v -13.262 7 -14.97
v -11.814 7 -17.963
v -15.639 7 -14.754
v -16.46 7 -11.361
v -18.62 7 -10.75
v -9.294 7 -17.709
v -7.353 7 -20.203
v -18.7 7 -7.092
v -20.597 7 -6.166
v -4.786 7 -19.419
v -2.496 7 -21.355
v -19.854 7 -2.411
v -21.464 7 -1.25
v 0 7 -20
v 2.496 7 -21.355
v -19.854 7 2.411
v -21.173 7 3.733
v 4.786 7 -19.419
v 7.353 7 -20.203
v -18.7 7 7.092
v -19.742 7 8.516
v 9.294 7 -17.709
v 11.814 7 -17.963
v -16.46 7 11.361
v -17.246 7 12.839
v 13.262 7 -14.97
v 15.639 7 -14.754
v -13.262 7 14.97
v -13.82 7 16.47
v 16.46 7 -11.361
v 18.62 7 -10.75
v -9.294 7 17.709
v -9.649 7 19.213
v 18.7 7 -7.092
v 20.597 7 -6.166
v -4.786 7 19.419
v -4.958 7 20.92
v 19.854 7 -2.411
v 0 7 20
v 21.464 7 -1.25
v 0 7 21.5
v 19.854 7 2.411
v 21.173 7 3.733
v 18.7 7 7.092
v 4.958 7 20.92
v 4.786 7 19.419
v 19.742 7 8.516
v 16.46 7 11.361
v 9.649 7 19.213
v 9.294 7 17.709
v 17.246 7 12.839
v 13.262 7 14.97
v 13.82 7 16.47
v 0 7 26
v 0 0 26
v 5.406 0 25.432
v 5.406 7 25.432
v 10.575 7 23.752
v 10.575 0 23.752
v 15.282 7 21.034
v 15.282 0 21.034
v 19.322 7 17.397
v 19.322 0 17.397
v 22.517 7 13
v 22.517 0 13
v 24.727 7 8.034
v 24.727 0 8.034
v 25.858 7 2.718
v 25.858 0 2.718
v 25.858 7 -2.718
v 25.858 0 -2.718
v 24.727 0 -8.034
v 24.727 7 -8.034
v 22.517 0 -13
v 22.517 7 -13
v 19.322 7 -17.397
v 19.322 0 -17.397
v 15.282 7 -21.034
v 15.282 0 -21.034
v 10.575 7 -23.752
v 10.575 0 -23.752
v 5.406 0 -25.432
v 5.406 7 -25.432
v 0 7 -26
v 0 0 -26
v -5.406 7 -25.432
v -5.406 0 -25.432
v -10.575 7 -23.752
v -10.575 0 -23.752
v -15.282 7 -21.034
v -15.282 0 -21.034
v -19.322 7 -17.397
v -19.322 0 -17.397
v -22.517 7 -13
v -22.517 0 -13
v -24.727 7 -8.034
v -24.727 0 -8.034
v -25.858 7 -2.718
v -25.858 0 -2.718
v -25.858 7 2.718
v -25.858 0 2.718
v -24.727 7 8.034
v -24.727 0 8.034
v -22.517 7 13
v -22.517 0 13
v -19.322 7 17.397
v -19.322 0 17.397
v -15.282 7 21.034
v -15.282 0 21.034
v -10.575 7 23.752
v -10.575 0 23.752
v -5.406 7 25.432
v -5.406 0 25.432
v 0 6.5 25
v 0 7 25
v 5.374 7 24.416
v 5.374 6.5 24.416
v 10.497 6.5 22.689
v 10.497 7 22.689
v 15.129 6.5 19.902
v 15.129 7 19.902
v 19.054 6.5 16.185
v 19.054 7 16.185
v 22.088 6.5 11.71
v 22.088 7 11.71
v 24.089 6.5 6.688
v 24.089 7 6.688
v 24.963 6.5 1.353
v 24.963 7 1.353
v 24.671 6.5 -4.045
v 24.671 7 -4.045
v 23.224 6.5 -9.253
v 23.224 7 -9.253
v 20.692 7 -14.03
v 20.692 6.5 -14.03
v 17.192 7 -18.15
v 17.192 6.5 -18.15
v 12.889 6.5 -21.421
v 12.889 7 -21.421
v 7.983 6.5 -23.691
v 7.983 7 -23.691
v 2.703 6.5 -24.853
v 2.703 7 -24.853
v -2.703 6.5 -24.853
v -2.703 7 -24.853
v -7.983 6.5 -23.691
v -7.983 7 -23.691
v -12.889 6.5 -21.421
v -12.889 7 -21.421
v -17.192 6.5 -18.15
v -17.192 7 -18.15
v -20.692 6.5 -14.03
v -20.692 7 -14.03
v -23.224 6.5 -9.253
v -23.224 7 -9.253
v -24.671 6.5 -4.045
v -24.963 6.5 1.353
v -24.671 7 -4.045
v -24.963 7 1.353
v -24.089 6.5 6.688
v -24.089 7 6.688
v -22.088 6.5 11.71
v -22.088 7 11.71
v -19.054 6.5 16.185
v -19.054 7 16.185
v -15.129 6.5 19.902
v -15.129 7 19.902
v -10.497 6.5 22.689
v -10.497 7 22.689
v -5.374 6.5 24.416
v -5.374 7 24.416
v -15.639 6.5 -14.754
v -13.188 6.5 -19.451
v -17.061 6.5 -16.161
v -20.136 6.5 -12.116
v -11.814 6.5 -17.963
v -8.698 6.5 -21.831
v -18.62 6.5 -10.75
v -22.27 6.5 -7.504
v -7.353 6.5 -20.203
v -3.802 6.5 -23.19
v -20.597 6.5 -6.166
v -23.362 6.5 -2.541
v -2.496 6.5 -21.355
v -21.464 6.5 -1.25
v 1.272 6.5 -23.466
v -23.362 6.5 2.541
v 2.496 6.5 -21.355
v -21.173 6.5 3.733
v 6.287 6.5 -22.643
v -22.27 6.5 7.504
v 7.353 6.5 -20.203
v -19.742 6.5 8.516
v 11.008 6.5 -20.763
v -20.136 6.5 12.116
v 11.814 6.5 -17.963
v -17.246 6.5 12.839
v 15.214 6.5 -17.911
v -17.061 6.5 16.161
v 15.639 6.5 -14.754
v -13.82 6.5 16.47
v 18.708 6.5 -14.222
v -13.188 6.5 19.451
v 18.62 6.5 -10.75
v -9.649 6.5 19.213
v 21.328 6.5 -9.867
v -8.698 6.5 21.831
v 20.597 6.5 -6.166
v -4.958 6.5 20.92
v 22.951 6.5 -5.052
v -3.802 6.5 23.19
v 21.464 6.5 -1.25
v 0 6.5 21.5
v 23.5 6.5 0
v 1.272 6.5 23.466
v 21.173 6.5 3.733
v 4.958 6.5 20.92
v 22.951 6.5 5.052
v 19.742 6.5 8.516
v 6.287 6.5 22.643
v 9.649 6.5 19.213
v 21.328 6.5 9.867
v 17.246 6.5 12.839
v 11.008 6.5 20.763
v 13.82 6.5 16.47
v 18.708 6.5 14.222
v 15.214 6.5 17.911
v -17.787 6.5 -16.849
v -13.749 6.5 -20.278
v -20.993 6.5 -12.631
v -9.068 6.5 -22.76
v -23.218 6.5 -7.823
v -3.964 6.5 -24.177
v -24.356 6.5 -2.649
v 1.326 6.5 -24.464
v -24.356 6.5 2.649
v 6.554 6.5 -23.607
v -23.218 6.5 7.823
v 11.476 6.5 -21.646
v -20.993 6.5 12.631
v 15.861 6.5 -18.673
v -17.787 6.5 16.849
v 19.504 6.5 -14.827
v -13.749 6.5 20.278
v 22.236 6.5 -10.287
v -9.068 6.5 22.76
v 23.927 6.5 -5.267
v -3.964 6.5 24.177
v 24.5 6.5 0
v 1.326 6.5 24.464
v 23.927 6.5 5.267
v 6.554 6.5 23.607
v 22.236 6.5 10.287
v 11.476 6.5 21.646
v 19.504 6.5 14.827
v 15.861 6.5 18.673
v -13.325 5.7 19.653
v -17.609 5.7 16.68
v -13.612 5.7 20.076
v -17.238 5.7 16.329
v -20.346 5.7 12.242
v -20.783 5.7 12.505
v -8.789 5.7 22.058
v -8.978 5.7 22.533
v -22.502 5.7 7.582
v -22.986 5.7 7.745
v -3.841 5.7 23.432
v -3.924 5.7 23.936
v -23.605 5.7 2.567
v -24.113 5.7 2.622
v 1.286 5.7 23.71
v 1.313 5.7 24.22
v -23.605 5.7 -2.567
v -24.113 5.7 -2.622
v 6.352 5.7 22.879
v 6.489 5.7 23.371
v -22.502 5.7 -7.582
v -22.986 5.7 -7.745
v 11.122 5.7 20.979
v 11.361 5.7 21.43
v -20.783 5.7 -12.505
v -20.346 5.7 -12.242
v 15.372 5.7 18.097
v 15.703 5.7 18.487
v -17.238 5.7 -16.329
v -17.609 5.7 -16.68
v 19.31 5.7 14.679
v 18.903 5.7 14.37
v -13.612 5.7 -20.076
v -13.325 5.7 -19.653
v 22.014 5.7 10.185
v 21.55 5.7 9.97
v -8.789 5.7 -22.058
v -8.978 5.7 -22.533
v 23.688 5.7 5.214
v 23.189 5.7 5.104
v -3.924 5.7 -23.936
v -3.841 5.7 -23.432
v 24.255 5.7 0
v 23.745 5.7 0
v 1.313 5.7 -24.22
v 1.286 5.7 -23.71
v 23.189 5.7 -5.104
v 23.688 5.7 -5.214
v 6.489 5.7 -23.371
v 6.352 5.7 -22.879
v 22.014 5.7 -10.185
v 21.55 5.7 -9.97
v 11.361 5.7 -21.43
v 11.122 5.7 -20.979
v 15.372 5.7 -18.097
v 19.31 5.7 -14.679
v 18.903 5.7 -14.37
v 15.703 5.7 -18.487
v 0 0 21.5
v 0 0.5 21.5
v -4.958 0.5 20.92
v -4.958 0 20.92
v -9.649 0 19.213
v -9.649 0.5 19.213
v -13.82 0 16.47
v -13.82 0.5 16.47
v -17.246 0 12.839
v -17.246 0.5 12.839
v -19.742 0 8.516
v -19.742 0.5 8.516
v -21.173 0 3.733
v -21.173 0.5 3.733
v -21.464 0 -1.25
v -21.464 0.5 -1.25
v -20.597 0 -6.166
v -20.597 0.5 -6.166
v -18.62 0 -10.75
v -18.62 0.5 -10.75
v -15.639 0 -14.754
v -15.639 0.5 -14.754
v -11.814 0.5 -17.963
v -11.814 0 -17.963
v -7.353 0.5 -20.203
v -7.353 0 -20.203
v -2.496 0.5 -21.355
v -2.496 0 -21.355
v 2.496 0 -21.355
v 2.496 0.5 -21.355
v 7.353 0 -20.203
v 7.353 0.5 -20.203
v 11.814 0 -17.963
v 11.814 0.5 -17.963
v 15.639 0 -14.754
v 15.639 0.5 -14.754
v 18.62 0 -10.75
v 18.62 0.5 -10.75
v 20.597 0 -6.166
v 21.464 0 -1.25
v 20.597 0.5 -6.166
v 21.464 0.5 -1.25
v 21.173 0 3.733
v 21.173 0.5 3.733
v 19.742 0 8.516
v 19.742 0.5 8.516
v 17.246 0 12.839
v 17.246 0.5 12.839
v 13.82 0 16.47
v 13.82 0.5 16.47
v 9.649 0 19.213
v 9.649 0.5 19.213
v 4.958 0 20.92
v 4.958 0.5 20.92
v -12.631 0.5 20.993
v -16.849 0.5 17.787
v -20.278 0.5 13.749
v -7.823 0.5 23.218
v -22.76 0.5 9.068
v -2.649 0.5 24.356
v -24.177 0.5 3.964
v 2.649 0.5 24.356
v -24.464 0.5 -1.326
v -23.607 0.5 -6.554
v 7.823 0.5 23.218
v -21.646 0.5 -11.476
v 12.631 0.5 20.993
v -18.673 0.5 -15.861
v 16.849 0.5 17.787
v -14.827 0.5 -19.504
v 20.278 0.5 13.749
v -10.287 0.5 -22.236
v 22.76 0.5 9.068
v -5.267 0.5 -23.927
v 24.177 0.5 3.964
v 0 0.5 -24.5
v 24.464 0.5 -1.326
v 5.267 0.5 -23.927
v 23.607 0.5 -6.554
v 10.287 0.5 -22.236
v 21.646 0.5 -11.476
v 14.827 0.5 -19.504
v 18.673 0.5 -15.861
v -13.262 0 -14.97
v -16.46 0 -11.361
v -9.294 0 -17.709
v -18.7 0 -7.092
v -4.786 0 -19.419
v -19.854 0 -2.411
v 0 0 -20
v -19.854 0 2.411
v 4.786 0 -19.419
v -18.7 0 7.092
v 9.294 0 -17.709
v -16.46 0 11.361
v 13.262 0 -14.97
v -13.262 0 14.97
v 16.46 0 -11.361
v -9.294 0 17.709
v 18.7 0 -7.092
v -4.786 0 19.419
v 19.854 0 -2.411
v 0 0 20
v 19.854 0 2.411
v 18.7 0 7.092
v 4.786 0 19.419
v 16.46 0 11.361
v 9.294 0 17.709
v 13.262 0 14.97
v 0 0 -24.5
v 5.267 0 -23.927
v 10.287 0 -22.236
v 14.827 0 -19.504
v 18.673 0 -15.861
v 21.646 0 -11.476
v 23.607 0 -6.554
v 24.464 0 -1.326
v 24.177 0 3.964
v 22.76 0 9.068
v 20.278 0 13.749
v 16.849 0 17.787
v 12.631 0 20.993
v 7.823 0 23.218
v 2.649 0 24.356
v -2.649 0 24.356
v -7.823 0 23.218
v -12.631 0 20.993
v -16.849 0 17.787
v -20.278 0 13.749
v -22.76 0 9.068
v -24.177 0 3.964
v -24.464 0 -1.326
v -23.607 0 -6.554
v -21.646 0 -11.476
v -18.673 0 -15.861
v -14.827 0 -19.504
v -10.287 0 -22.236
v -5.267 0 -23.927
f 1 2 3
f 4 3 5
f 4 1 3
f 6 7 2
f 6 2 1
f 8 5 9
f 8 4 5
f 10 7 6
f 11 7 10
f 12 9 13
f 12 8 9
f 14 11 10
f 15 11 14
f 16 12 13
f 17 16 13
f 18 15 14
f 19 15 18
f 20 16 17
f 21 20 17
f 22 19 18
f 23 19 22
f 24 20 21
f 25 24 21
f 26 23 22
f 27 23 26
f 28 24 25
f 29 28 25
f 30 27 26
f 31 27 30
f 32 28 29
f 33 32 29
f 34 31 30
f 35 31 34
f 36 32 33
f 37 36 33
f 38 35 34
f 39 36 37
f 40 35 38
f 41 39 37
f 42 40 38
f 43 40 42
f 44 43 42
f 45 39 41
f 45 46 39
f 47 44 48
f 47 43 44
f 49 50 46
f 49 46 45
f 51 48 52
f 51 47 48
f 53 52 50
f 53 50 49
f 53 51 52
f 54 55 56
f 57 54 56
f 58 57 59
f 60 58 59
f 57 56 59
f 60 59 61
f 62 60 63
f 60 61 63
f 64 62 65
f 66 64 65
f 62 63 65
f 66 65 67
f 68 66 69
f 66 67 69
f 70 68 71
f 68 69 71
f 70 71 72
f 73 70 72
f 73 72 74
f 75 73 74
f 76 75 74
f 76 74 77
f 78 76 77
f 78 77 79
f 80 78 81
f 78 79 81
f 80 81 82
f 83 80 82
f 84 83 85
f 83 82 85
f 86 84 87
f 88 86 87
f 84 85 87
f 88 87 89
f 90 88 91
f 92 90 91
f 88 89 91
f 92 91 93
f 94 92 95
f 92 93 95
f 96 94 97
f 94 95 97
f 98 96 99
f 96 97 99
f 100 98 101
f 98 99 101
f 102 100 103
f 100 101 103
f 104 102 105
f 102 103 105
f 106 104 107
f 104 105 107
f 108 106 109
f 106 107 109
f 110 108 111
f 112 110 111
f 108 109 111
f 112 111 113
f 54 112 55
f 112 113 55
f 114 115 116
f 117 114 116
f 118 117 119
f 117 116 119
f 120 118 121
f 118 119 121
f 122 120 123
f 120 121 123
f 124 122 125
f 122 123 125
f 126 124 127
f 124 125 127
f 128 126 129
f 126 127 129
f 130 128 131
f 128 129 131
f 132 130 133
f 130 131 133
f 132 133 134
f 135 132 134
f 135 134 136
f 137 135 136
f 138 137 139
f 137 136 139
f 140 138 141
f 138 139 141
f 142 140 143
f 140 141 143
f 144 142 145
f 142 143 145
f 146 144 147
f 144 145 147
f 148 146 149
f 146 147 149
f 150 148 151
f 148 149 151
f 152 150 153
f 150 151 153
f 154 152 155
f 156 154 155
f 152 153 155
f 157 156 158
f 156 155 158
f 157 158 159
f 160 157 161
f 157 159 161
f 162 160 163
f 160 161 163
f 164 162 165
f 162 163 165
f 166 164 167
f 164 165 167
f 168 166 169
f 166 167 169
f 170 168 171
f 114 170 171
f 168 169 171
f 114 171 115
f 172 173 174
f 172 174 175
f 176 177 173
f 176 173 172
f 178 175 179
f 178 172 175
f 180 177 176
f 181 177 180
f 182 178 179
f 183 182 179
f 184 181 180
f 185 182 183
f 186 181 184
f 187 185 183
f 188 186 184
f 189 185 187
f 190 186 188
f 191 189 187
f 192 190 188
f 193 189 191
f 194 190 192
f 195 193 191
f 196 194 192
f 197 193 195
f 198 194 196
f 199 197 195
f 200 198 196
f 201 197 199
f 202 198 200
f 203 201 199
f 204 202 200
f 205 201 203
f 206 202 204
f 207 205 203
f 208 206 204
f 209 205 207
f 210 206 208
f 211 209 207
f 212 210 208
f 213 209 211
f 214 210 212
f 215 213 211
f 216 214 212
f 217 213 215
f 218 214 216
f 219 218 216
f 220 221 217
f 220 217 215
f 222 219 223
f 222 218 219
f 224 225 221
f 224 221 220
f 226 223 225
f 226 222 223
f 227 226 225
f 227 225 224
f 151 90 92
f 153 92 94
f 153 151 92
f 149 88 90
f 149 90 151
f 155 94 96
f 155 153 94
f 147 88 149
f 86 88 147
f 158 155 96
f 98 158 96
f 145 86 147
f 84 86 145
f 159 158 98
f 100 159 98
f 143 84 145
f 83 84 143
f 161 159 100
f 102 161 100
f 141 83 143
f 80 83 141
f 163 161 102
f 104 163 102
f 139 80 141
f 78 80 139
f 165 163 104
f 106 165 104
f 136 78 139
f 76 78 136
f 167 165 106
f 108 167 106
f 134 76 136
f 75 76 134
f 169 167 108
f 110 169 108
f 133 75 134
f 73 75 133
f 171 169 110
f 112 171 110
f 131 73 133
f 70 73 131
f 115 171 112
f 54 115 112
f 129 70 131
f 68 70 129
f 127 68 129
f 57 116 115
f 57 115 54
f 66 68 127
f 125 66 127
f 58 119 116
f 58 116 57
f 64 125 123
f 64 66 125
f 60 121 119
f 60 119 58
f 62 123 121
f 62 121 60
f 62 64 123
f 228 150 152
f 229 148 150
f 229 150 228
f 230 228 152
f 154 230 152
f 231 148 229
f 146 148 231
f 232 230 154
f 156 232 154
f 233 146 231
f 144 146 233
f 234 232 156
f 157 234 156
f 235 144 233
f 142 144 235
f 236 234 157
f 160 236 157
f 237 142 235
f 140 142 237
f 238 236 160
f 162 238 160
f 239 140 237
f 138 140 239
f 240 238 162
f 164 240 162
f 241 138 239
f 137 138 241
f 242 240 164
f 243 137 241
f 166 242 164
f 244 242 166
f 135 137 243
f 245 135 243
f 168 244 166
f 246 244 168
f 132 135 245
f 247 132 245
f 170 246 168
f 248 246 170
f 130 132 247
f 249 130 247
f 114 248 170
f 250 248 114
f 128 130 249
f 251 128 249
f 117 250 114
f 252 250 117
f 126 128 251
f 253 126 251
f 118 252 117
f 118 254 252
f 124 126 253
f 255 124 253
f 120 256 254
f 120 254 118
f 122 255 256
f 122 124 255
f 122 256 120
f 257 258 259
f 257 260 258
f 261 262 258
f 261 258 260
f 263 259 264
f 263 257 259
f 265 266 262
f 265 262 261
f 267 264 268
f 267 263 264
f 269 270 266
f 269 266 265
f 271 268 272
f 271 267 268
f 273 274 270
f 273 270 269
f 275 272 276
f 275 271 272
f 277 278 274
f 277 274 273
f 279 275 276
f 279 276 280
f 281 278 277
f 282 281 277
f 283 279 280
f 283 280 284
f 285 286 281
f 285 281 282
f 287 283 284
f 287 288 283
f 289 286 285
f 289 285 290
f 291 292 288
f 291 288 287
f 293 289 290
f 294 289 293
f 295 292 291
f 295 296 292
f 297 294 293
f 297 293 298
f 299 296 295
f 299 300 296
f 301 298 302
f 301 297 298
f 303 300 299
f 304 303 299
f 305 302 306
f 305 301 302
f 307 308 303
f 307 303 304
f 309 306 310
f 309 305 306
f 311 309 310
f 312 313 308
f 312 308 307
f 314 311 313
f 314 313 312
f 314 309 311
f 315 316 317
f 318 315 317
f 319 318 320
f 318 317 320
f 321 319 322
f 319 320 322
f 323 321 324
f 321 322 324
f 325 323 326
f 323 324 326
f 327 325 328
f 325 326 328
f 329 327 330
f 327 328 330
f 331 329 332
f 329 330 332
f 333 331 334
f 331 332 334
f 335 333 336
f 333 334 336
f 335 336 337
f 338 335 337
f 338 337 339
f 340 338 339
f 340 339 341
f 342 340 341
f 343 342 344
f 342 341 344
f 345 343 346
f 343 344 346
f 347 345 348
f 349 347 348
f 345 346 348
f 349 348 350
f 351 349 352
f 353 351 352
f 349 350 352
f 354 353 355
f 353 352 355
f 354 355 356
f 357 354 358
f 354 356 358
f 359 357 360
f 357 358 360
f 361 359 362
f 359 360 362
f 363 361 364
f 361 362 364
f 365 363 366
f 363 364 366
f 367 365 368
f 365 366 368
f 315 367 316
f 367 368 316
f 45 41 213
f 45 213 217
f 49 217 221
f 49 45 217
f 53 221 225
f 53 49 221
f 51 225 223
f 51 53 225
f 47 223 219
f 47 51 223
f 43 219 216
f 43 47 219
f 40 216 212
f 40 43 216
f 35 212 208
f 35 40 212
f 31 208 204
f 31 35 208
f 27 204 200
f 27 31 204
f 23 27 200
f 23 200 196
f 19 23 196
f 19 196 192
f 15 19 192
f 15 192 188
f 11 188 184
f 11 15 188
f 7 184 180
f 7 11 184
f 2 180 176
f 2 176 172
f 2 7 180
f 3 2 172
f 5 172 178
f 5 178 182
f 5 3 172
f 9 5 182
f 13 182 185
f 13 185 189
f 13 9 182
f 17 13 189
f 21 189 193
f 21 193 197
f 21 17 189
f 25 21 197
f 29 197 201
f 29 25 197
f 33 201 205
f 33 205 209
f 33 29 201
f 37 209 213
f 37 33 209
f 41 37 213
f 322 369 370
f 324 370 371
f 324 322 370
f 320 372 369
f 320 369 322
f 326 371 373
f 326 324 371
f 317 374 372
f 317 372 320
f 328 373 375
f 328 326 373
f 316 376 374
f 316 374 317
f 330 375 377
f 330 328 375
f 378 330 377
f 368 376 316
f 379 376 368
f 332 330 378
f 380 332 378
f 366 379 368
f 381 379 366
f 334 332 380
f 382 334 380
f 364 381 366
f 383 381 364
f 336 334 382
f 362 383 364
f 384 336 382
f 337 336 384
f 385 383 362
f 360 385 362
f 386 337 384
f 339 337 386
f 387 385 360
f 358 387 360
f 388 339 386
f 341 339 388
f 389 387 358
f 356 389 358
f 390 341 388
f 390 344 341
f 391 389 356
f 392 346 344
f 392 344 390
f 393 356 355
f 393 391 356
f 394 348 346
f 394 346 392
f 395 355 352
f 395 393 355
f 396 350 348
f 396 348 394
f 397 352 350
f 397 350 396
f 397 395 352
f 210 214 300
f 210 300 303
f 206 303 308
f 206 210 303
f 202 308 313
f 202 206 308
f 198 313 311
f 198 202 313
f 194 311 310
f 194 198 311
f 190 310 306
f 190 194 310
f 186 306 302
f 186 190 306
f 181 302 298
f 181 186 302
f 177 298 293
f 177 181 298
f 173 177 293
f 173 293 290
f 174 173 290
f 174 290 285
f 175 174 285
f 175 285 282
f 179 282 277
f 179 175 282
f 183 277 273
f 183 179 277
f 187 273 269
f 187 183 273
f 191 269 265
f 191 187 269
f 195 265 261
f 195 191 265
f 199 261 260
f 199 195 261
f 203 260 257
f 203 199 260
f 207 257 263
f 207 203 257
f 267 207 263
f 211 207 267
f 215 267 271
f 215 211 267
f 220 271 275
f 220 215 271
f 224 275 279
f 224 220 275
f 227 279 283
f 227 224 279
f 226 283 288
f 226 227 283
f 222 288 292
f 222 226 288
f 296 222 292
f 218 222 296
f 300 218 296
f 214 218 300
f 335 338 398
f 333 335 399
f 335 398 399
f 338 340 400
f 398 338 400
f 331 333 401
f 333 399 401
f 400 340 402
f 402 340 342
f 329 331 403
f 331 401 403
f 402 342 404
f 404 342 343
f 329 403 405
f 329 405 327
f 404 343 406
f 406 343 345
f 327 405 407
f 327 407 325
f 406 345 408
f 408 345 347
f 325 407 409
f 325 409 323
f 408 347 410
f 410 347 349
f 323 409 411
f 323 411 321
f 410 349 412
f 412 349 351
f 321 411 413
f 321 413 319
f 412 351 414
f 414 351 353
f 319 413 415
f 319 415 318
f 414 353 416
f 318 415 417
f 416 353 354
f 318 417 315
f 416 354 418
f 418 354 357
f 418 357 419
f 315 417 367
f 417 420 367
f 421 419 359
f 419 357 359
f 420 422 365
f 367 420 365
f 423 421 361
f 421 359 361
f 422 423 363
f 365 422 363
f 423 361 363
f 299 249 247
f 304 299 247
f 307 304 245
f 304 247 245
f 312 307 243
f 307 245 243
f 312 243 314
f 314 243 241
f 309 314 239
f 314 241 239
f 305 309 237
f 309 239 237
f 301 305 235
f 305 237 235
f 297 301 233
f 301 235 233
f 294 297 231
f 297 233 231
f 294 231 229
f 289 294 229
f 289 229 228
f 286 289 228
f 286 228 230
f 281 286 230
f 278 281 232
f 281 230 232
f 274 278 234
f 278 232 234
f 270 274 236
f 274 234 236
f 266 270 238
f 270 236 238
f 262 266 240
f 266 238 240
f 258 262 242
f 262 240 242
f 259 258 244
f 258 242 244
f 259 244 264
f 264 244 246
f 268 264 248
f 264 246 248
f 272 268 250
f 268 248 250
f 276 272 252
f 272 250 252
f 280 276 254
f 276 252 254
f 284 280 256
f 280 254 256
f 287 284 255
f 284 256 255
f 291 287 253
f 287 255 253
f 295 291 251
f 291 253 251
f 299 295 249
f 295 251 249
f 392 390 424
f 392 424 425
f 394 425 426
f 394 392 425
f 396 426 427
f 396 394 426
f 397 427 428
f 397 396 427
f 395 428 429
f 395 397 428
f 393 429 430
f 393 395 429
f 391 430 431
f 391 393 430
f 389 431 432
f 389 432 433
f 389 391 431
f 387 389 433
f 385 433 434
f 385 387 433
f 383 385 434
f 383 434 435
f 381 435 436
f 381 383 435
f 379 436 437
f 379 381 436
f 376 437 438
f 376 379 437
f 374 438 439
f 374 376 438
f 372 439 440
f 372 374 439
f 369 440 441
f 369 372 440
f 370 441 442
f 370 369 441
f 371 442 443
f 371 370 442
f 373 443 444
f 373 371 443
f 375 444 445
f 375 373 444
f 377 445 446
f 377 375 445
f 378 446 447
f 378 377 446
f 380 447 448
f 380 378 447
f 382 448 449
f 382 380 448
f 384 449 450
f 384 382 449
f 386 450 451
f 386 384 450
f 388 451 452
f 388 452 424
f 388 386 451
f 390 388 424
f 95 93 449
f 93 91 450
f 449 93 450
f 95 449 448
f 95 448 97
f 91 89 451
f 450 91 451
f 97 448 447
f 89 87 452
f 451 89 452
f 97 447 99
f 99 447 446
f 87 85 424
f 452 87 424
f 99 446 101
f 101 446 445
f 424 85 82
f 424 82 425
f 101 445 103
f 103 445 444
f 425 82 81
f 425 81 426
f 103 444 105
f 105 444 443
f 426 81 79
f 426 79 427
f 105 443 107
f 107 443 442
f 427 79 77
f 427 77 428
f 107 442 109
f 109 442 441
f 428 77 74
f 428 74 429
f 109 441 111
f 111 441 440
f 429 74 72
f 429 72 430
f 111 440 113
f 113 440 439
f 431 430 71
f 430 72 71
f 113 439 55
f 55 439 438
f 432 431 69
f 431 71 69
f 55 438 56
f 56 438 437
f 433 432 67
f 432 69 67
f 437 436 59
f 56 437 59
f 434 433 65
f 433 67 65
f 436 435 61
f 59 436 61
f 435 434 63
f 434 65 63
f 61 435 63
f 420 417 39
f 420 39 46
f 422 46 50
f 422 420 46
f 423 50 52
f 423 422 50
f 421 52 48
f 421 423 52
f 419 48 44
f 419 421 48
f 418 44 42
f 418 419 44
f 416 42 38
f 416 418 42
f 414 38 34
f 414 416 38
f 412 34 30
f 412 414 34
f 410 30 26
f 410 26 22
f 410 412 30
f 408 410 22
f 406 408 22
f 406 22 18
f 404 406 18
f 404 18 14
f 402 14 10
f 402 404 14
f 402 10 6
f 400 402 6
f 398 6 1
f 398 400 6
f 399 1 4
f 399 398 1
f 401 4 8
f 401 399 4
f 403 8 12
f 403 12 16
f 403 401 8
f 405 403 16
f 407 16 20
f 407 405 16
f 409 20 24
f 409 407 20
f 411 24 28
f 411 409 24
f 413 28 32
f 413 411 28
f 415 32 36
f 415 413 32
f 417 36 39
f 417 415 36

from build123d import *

# Parameters (mm, degrees)
SKETCH_1_R          = 26
SKETCH_1_R_2        = 20
EXTRUDE_1_DEPTH     = 7
SKETCH_2_R          = 25
SKETCH_2_R_2        = 21.5
CUT_EXTRUDE_1_DEPTH = 0.5
SKETCH_3_R          = 24.5
SKETCH_3_R_2        = 23.5
CUT_EXTRUDE_2_DEPTH = 0.8
CUT_EXTRUDE_2_DRAFT = -17
CUT_EXTRUDE_START   = -0.5
SKETCH_4_R          = 24.5
SKETCH_4_R_2        = 21.5
CUT_EXTRUDE_3_DEPTH = 0.5


with BuildPart() as part:
    # Эскиз1 → Бобышка-Вытянуть1 (new body)
    with BuildSketch(Plane(origin=(0, 0, 0), x_dir=(1, 0, 0), z_dir=(0, 1, 0))):
        with Locations(Location((0, 0, 0), (0, 0, 270))):
            Circle(SKETCH_1_R)
        with Locations(Location((0, 0, 0), (0, 0, 270))):
            Circle(SKETCH_1_R_2, mode=Mode.SUBTRACT)
    extrude(amount=EXTRUDE_1_DEPTH)

    # Эскиз2 → Вырез-Вытянуть1 (cut)
    with BuildSketch(Plane(origin=(0, 7, 0), x_dir=(1, 0, 0), z_dir=(0, 1, 0))):
        with Locations(Location((0, 0, 0), (0, 0, 270))):
            Circle(SKETCH_2_R)
        with Locations(Location((0, 0, 0), (0, 0, 270))):
            Circle(SKETCH_2_R_2, mode=Mode.SUBTRACT)
    extrude(amount=-CUT_EXTRUDE_1_DEPTH, mode=Mode.SUBTRACT)


with BuildPart() as cut_extrude_2_tool:
    # Эскиз3 → Вырез-Вытянуть2 (with draft: the straight prism first)
    with BuildSketch(Plane(origin=(0, 6.5, 0), x_dir=(1, 0, 0), z_dir=(0, 1, 0))):
        Circle(SKETCH_3_R)
        Circle(SKETCH_3_R_2, mode=Mode.SUBTRACT)
    extrude(amount=-CUT_EXTRUDE_2_DEPTH)
    # Вырез-Вытянуть2: the draft: its side faces are tilted about the plane it starts from
    cut_extrude_2_sides = [cut_extrude_2_tool.faces().sort_by_distance(p)[0] for p in [
        (-24.5, 6.1, 0),
        (-23.5, 6.1, 0),
    ]]
    draft(cut_extrude_2_sides, Plane(origin=(0, 6.5, 0), x_dir=(1, 0, 0), z_dir=(0, 1, 0)), CUT_EXTRUDE_2_DRAFT)


with BuildPart() as part_1:
    add(part.part)

    # Вырез-Вытянуть2: cut by cut_extrude_2_tool
    add(cut_extrude_2_tool.part, mode=Mode.SUBTRACT)

    # Эскиз4 → Вырез-Вытянуть3 (cut)
    with BuildSketch(Plane.XZ.offset(CUT_EXTRUDE_START)):
        with Locations(Location((0, 0, 0), (0, 0, 270))):
            Circle(SKETCH_4_R)
        with Locations(Location((0, 0, 0), (0, 0, 90))):
            Circle(SKETCH_4_R_2, mode=Mode.SUBTRACT)
    extrude(amount=CUT_EXTRUDE_3_DEPTH, mode=Mode.SUBTRACT)


solid = part_1.part
